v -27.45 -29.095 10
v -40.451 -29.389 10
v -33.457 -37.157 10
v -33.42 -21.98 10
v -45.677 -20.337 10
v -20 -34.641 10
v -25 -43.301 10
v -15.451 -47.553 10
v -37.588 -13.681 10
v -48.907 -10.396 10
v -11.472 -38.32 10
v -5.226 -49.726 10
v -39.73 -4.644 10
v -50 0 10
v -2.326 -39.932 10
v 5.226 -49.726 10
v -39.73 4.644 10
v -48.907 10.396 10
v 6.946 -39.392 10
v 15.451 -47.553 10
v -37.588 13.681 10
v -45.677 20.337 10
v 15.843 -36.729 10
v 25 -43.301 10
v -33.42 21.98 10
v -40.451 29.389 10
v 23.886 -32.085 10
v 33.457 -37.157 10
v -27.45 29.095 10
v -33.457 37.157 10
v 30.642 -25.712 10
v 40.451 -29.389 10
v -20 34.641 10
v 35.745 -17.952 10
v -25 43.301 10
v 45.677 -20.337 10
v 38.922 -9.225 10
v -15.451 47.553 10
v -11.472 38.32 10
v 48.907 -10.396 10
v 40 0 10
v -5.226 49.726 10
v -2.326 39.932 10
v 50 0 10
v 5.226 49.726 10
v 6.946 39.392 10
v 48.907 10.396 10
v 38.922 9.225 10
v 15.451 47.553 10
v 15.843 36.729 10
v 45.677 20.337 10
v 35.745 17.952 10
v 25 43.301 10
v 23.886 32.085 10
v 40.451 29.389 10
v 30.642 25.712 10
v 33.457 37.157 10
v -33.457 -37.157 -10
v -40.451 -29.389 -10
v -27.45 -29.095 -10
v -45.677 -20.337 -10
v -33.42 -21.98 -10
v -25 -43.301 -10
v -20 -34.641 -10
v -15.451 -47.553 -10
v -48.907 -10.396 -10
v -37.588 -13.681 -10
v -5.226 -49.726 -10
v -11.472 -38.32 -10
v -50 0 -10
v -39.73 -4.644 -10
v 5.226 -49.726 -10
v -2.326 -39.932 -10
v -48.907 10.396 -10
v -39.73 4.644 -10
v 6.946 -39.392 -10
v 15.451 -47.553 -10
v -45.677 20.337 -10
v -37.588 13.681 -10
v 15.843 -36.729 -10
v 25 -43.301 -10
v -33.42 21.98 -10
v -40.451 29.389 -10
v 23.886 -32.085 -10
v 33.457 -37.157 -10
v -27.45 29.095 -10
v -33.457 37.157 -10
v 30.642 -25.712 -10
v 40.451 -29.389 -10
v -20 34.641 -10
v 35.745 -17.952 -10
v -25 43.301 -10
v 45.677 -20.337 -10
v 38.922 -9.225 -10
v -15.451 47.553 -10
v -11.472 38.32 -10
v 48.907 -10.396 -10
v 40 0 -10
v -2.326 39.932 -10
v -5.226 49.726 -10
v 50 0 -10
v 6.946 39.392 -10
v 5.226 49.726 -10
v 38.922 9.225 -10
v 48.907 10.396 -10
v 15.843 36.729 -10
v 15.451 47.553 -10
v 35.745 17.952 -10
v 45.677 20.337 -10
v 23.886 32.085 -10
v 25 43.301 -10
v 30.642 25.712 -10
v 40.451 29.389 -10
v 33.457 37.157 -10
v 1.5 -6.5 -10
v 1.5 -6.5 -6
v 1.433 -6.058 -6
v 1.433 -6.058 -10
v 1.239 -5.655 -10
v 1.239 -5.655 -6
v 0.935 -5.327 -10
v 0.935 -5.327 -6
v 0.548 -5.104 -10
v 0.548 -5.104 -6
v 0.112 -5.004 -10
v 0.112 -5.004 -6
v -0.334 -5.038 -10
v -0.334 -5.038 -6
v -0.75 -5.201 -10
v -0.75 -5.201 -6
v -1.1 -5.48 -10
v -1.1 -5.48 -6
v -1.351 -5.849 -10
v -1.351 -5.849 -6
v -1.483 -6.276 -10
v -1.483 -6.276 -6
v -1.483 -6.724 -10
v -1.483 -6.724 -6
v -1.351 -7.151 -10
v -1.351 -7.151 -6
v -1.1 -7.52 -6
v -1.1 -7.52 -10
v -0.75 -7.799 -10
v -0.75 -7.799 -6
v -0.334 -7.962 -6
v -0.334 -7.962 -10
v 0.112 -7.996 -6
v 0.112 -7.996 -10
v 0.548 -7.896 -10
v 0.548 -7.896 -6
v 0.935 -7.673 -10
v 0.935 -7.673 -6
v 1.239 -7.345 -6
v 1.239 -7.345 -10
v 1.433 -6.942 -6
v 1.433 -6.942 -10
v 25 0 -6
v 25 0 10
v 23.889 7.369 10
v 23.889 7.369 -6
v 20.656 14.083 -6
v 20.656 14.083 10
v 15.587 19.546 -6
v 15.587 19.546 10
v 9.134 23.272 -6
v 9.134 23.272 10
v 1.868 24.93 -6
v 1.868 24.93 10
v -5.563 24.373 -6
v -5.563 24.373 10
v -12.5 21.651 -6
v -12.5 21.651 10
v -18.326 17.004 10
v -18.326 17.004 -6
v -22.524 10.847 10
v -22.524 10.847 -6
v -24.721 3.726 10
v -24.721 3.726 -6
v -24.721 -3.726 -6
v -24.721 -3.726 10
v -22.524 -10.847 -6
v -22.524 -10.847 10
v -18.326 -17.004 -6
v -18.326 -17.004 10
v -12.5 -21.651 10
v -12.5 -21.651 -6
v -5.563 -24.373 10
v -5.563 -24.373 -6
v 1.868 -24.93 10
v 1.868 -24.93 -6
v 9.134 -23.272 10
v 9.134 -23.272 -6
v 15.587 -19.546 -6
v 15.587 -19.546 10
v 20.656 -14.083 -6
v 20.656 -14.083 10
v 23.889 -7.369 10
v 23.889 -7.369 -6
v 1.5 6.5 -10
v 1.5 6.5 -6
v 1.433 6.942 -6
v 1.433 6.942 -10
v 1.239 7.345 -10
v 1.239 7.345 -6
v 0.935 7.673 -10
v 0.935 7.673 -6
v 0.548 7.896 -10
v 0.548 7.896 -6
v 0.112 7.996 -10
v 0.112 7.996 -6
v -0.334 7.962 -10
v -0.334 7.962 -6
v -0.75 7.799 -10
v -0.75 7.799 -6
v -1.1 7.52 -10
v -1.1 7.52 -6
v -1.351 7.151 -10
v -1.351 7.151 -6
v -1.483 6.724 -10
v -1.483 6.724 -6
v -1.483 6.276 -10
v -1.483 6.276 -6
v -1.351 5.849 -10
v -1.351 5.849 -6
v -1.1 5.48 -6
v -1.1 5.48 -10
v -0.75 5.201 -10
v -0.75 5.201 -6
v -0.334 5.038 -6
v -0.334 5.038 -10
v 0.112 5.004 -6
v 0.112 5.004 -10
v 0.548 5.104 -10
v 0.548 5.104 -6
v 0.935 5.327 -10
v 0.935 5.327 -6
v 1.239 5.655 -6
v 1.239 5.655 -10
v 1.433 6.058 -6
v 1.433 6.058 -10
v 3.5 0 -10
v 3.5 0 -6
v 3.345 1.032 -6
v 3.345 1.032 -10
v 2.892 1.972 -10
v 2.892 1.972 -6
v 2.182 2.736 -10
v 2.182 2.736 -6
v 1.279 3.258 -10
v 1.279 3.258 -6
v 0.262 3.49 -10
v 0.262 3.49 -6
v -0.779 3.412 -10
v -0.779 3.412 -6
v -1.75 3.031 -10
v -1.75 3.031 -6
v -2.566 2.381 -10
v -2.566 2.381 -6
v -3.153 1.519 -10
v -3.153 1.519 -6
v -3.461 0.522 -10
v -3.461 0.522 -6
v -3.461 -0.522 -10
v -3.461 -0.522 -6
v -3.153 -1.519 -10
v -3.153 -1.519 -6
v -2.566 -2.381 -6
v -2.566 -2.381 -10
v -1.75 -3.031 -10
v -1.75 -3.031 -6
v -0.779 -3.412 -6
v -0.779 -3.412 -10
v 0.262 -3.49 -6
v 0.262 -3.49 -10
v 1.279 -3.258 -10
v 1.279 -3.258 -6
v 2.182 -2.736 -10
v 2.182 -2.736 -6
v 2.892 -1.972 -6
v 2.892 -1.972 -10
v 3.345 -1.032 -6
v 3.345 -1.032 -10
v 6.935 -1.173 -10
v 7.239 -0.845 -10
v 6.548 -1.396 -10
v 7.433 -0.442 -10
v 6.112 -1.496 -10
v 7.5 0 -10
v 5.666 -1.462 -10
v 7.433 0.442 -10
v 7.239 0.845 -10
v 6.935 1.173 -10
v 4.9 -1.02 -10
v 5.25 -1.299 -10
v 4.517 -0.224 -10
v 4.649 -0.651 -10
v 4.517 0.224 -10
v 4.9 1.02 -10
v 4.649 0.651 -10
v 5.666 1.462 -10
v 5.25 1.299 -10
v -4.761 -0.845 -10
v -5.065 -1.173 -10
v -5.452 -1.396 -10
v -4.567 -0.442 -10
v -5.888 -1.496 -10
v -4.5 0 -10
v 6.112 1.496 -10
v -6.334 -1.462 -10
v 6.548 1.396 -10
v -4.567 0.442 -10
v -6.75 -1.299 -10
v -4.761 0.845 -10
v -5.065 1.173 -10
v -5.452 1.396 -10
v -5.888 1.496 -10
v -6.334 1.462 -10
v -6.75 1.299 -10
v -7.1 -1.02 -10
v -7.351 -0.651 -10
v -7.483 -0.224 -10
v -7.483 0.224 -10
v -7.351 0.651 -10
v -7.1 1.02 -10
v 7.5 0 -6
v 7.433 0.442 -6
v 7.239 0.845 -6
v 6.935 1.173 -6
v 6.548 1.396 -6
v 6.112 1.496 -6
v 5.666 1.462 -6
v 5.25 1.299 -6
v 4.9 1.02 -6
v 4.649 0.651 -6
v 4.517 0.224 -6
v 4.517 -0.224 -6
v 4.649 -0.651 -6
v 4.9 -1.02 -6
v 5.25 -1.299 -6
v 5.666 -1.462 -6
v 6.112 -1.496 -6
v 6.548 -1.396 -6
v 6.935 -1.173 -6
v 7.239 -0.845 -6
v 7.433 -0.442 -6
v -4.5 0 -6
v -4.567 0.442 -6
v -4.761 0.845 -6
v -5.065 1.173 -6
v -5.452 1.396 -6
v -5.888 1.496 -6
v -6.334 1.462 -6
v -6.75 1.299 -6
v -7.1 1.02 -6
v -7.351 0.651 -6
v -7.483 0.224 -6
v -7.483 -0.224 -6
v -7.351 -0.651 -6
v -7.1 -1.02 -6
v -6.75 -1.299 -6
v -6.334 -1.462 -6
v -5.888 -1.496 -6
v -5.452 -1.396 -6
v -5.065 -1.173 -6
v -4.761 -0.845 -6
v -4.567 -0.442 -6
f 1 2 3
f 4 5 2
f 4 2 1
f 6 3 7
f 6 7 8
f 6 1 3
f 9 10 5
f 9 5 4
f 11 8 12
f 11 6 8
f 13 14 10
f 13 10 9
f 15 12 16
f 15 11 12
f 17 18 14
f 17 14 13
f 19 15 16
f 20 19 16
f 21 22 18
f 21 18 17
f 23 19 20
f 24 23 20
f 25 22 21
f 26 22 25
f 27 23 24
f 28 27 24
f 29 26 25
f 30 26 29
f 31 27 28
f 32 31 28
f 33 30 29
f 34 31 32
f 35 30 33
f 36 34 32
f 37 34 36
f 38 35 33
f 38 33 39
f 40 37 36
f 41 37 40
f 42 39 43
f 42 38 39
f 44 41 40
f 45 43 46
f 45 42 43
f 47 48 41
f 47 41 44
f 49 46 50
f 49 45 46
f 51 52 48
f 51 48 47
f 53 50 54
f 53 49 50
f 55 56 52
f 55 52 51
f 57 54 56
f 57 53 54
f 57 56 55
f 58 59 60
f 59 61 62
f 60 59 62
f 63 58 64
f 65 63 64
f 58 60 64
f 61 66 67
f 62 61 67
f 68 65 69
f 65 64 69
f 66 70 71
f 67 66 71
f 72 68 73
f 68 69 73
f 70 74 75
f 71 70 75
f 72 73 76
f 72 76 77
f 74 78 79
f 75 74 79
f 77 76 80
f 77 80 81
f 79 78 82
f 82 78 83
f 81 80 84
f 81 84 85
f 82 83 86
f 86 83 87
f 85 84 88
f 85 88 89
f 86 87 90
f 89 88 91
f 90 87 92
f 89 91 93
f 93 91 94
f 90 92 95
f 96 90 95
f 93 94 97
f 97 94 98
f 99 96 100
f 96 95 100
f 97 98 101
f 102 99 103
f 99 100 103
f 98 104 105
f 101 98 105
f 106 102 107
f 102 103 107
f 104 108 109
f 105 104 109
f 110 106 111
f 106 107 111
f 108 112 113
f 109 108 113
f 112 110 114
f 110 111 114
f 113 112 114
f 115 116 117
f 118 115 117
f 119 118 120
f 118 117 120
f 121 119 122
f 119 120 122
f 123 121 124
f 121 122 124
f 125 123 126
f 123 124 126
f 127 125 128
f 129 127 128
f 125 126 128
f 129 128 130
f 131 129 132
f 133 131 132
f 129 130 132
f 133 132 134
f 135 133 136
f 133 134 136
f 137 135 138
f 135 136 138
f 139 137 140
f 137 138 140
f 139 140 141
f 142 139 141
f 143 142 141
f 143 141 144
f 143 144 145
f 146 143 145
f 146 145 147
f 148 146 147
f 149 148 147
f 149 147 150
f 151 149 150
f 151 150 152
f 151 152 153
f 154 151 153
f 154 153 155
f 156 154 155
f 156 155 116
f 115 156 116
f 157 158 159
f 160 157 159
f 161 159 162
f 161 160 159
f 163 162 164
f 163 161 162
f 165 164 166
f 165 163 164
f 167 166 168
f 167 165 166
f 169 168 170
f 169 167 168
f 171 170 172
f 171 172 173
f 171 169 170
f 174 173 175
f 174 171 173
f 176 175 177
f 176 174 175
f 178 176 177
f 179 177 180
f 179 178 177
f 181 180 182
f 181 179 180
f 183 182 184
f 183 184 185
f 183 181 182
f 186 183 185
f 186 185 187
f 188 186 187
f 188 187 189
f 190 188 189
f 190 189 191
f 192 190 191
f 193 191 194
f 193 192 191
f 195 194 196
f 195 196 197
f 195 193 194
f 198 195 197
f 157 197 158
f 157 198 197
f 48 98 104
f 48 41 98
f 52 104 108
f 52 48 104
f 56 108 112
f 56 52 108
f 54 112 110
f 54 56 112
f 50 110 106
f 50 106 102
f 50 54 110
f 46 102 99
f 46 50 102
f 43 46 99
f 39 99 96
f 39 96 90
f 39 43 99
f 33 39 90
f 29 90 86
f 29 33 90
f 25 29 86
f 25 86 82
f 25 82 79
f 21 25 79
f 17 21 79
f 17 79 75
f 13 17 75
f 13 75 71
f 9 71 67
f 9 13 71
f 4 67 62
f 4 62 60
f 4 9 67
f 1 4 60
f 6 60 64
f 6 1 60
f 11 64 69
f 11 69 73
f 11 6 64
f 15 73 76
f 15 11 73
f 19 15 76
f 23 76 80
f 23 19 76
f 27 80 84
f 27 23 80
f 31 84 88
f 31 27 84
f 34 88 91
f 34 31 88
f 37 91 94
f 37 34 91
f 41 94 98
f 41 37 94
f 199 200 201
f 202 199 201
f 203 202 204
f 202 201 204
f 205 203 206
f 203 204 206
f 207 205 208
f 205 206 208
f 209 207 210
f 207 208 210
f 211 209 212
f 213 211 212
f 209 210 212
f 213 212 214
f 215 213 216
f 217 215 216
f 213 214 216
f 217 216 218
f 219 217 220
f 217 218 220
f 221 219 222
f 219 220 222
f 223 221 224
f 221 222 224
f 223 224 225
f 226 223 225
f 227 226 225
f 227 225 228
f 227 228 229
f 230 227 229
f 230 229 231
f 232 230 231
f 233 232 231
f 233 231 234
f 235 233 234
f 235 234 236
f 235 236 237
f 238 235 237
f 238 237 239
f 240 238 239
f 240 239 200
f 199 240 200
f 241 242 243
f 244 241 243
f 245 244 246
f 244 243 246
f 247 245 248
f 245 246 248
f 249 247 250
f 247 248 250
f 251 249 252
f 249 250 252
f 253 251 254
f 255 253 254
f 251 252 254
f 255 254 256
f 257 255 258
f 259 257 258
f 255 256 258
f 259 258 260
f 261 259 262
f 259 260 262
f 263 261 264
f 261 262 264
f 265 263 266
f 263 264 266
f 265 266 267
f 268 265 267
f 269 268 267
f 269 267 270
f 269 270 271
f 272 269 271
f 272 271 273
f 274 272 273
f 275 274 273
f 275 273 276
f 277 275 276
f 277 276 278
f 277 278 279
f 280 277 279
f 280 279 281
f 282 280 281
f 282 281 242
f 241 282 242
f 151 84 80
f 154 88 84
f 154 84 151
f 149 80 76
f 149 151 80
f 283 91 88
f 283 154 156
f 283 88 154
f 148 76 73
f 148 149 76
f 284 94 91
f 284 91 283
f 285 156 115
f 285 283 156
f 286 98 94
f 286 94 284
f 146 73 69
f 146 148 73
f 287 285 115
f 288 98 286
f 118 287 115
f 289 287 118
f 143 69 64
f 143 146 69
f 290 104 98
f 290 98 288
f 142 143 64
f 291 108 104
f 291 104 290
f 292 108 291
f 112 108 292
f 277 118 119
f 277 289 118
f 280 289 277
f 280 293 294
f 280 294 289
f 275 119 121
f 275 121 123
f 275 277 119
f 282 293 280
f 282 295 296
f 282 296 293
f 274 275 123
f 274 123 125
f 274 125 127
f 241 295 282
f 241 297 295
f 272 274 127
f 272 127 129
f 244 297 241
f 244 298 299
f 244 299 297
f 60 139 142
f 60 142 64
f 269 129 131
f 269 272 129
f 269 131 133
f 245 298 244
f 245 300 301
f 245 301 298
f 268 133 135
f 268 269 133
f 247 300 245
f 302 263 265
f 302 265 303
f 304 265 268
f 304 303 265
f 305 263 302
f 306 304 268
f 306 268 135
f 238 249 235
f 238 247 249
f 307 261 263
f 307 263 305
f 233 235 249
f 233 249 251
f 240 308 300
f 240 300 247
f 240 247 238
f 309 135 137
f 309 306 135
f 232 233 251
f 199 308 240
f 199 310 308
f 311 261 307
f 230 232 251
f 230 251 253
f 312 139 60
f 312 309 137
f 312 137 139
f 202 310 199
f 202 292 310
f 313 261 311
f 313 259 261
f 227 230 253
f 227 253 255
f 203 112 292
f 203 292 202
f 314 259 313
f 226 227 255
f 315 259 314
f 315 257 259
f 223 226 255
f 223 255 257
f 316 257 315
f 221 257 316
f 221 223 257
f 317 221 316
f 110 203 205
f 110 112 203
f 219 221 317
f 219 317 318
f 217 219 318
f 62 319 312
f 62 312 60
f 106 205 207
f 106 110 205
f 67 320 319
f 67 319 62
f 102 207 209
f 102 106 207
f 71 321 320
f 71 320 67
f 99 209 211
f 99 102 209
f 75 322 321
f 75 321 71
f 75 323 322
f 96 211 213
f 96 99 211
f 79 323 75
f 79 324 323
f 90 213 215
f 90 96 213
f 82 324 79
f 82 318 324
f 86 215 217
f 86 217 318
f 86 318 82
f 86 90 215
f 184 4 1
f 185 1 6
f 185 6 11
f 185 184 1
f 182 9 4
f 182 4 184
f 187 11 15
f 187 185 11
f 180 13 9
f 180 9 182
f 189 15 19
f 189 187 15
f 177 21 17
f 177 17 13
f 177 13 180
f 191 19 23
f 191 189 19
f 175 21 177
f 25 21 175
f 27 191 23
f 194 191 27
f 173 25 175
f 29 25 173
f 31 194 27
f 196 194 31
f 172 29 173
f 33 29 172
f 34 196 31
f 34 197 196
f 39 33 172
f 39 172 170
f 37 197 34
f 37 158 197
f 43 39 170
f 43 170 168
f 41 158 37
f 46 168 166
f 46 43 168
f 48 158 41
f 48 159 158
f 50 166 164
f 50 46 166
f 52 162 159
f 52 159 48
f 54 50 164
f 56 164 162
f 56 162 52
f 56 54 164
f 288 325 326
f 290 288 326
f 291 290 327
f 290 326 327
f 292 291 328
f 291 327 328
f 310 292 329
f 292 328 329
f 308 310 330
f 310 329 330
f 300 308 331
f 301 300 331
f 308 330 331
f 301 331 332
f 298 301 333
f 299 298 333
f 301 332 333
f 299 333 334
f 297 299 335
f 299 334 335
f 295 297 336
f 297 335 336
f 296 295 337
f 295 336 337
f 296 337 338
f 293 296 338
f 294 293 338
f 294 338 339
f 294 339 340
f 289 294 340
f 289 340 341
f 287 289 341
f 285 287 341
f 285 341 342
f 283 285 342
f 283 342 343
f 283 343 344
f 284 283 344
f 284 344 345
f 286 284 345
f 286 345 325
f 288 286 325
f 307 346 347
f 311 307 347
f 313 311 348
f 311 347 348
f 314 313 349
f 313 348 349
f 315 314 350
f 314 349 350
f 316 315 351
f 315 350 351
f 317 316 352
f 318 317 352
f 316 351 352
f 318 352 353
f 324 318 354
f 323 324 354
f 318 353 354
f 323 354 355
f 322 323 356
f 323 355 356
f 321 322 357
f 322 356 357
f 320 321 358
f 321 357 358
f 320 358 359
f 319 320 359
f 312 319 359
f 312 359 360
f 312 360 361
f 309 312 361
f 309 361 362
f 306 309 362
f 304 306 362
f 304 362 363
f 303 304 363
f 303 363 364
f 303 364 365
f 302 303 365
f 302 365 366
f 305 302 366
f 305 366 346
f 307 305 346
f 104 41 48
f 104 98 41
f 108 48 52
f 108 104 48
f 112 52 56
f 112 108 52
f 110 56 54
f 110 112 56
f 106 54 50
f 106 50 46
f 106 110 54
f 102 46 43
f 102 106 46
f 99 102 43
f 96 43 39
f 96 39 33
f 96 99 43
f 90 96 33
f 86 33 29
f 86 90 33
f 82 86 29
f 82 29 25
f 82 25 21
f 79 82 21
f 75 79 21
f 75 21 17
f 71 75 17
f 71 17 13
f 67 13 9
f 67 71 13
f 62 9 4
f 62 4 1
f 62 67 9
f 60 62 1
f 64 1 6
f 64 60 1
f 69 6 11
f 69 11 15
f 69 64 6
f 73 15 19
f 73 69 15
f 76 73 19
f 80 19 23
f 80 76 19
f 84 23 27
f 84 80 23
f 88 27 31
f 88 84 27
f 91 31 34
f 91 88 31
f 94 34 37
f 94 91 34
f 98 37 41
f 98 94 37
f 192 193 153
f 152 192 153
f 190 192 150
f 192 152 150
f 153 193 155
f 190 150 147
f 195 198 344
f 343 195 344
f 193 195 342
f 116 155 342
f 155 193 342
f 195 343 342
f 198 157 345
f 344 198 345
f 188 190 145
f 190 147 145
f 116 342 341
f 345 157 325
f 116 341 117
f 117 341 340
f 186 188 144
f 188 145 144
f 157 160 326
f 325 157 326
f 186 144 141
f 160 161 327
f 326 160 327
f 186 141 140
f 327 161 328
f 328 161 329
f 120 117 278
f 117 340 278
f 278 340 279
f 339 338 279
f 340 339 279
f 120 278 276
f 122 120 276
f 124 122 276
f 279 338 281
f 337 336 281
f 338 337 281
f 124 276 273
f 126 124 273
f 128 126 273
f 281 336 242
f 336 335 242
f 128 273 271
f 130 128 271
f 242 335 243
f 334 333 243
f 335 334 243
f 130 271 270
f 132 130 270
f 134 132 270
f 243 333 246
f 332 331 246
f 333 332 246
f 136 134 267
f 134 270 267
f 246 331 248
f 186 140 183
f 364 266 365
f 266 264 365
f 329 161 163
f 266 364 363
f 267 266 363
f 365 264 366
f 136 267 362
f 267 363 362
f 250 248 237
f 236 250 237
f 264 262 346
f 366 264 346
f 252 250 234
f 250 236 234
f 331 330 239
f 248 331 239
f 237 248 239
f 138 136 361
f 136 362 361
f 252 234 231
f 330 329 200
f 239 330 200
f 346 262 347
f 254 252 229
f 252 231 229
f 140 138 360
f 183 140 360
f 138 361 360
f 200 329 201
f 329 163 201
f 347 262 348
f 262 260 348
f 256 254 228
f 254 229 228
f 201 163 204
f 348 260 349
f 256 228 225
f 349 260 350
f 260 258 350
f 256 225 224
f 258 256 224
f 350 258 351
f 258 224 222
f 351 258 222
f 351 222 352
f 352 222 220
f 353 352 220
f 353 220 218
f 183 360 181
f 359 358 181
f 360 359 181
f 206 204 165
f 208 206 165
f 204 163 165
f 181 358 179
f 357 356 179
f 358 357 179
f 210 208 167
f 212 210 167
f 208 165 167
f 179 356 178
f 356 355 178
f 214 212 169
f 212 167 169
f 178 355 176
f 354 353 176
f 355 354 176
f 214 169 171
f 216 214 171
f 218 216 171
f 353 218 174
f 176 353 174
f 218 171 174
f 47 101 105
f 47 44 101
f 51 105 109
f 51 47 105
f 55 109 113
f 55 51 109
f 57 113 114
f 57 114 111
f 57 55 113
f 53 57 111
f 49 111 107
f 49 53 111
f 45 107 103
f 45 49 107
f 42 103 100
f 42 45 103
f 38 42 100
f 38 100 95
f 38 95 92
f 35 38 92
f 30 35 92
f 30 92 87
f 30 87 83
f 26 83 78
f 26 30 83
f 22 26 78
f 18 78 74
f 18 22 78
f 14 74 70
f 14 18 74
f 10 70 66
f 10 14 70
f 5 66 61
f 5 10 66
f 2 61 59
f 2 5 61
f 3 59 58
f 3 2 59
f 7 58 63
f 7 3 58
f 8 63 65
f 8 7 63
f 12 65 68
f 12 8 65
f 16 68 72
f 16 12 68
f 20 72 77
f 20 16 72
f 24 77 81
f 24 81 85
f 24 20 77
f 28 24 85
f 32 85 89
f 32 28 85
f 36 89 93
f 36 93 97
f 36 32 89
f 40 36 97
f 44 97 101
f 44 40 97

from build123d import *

# Parameters (mm, degrees)
SKETCH_1_R          = 50
SKETCH_1_R_2        = 40
EXTRUDE_1_DEPTH     = 10
SKETCH_3_R          = 40
SKETCH_3_R_2        = 37
EXTRUDE_2_DEPTH     = 10
SKETCH_4_R          = 37
EXTRUDE_3_DEPTH     = 4
SKETCH_5_R          = 3.5
SKETCH_5_R_2        = 1.5
CUT_EXTRUDE_1_DEPTH = 73.498275842
SKETCH_6_R          = 37
SKETCH_6_R_2        = 25
EXTRUDE_4_DEPTH     = 16


with BuildPart() as part:
    # 草图1 → 凸台-拉伸1 (new, symmetric)
    with BuildSketch(Plane.XY):
        Circle(SKETCH_1_R)
        Circle(SKETCH_1_R_2, mode=Mode.SUBTRACT)
    extrude(amount=EXTRUDE_1_DEPTH, both=True)


with BuildPart() as body_2:
    # 草图3 → 凸台-拉伸2 (new, symmetric)
    with BuildSketch(Plane.XY):
        Circle(SKETCH_3_R)
        Circle(SKETCH_3_R_2, mode=Mode.SUBTRACT)
    extrude(amount=EXTRUDE_2_DEPTH, both=True)

    # 草图4 → 凸台-拉伸3 (add)
    with BuildSketch(Plane(origin=(0, 0, -10), x_dir=(-1, 0, 0), z_dir=(0, 0, -1))):
        Circle(SKETCH_4_R)
    extrude(amount=-EXTRUDE_3_DEPTH)

    # 草图5 → 切除-拉伸1 (cut, through all)
    with BuildSketch(Plane.XY.offset(-6)):
        Circle(SKETCH_5_R)
        with Locations((0, 6.5)):
            Circle(SKETCH_5_R_2)
        with Locations((-6, 0)):
            Circle(SKETCH_5_R_2)
        with Locations((6, 0)):
            Circle(SKETCH_5_R_2)
        with Locations((0, -6.5)):
            Circle(SKETCH_5_R_2)
    extrude(amount=-CUT_EXTRUDE_1_DEPTH, mode=Mode.SUBTRACT)

    # 草图6 → 凸台-拉伸4 (add)
    with BuildSketch(Plane.XY.offset(-6)):
        Circle(SKETCH_6_R)
        Circle(SKETCH_6_R_2, mode=Mode.SUBTRACT)
    extrude(amount=EXTRUDE_4_DEPTH)


solid = Compound([part.part, body_2.part])
